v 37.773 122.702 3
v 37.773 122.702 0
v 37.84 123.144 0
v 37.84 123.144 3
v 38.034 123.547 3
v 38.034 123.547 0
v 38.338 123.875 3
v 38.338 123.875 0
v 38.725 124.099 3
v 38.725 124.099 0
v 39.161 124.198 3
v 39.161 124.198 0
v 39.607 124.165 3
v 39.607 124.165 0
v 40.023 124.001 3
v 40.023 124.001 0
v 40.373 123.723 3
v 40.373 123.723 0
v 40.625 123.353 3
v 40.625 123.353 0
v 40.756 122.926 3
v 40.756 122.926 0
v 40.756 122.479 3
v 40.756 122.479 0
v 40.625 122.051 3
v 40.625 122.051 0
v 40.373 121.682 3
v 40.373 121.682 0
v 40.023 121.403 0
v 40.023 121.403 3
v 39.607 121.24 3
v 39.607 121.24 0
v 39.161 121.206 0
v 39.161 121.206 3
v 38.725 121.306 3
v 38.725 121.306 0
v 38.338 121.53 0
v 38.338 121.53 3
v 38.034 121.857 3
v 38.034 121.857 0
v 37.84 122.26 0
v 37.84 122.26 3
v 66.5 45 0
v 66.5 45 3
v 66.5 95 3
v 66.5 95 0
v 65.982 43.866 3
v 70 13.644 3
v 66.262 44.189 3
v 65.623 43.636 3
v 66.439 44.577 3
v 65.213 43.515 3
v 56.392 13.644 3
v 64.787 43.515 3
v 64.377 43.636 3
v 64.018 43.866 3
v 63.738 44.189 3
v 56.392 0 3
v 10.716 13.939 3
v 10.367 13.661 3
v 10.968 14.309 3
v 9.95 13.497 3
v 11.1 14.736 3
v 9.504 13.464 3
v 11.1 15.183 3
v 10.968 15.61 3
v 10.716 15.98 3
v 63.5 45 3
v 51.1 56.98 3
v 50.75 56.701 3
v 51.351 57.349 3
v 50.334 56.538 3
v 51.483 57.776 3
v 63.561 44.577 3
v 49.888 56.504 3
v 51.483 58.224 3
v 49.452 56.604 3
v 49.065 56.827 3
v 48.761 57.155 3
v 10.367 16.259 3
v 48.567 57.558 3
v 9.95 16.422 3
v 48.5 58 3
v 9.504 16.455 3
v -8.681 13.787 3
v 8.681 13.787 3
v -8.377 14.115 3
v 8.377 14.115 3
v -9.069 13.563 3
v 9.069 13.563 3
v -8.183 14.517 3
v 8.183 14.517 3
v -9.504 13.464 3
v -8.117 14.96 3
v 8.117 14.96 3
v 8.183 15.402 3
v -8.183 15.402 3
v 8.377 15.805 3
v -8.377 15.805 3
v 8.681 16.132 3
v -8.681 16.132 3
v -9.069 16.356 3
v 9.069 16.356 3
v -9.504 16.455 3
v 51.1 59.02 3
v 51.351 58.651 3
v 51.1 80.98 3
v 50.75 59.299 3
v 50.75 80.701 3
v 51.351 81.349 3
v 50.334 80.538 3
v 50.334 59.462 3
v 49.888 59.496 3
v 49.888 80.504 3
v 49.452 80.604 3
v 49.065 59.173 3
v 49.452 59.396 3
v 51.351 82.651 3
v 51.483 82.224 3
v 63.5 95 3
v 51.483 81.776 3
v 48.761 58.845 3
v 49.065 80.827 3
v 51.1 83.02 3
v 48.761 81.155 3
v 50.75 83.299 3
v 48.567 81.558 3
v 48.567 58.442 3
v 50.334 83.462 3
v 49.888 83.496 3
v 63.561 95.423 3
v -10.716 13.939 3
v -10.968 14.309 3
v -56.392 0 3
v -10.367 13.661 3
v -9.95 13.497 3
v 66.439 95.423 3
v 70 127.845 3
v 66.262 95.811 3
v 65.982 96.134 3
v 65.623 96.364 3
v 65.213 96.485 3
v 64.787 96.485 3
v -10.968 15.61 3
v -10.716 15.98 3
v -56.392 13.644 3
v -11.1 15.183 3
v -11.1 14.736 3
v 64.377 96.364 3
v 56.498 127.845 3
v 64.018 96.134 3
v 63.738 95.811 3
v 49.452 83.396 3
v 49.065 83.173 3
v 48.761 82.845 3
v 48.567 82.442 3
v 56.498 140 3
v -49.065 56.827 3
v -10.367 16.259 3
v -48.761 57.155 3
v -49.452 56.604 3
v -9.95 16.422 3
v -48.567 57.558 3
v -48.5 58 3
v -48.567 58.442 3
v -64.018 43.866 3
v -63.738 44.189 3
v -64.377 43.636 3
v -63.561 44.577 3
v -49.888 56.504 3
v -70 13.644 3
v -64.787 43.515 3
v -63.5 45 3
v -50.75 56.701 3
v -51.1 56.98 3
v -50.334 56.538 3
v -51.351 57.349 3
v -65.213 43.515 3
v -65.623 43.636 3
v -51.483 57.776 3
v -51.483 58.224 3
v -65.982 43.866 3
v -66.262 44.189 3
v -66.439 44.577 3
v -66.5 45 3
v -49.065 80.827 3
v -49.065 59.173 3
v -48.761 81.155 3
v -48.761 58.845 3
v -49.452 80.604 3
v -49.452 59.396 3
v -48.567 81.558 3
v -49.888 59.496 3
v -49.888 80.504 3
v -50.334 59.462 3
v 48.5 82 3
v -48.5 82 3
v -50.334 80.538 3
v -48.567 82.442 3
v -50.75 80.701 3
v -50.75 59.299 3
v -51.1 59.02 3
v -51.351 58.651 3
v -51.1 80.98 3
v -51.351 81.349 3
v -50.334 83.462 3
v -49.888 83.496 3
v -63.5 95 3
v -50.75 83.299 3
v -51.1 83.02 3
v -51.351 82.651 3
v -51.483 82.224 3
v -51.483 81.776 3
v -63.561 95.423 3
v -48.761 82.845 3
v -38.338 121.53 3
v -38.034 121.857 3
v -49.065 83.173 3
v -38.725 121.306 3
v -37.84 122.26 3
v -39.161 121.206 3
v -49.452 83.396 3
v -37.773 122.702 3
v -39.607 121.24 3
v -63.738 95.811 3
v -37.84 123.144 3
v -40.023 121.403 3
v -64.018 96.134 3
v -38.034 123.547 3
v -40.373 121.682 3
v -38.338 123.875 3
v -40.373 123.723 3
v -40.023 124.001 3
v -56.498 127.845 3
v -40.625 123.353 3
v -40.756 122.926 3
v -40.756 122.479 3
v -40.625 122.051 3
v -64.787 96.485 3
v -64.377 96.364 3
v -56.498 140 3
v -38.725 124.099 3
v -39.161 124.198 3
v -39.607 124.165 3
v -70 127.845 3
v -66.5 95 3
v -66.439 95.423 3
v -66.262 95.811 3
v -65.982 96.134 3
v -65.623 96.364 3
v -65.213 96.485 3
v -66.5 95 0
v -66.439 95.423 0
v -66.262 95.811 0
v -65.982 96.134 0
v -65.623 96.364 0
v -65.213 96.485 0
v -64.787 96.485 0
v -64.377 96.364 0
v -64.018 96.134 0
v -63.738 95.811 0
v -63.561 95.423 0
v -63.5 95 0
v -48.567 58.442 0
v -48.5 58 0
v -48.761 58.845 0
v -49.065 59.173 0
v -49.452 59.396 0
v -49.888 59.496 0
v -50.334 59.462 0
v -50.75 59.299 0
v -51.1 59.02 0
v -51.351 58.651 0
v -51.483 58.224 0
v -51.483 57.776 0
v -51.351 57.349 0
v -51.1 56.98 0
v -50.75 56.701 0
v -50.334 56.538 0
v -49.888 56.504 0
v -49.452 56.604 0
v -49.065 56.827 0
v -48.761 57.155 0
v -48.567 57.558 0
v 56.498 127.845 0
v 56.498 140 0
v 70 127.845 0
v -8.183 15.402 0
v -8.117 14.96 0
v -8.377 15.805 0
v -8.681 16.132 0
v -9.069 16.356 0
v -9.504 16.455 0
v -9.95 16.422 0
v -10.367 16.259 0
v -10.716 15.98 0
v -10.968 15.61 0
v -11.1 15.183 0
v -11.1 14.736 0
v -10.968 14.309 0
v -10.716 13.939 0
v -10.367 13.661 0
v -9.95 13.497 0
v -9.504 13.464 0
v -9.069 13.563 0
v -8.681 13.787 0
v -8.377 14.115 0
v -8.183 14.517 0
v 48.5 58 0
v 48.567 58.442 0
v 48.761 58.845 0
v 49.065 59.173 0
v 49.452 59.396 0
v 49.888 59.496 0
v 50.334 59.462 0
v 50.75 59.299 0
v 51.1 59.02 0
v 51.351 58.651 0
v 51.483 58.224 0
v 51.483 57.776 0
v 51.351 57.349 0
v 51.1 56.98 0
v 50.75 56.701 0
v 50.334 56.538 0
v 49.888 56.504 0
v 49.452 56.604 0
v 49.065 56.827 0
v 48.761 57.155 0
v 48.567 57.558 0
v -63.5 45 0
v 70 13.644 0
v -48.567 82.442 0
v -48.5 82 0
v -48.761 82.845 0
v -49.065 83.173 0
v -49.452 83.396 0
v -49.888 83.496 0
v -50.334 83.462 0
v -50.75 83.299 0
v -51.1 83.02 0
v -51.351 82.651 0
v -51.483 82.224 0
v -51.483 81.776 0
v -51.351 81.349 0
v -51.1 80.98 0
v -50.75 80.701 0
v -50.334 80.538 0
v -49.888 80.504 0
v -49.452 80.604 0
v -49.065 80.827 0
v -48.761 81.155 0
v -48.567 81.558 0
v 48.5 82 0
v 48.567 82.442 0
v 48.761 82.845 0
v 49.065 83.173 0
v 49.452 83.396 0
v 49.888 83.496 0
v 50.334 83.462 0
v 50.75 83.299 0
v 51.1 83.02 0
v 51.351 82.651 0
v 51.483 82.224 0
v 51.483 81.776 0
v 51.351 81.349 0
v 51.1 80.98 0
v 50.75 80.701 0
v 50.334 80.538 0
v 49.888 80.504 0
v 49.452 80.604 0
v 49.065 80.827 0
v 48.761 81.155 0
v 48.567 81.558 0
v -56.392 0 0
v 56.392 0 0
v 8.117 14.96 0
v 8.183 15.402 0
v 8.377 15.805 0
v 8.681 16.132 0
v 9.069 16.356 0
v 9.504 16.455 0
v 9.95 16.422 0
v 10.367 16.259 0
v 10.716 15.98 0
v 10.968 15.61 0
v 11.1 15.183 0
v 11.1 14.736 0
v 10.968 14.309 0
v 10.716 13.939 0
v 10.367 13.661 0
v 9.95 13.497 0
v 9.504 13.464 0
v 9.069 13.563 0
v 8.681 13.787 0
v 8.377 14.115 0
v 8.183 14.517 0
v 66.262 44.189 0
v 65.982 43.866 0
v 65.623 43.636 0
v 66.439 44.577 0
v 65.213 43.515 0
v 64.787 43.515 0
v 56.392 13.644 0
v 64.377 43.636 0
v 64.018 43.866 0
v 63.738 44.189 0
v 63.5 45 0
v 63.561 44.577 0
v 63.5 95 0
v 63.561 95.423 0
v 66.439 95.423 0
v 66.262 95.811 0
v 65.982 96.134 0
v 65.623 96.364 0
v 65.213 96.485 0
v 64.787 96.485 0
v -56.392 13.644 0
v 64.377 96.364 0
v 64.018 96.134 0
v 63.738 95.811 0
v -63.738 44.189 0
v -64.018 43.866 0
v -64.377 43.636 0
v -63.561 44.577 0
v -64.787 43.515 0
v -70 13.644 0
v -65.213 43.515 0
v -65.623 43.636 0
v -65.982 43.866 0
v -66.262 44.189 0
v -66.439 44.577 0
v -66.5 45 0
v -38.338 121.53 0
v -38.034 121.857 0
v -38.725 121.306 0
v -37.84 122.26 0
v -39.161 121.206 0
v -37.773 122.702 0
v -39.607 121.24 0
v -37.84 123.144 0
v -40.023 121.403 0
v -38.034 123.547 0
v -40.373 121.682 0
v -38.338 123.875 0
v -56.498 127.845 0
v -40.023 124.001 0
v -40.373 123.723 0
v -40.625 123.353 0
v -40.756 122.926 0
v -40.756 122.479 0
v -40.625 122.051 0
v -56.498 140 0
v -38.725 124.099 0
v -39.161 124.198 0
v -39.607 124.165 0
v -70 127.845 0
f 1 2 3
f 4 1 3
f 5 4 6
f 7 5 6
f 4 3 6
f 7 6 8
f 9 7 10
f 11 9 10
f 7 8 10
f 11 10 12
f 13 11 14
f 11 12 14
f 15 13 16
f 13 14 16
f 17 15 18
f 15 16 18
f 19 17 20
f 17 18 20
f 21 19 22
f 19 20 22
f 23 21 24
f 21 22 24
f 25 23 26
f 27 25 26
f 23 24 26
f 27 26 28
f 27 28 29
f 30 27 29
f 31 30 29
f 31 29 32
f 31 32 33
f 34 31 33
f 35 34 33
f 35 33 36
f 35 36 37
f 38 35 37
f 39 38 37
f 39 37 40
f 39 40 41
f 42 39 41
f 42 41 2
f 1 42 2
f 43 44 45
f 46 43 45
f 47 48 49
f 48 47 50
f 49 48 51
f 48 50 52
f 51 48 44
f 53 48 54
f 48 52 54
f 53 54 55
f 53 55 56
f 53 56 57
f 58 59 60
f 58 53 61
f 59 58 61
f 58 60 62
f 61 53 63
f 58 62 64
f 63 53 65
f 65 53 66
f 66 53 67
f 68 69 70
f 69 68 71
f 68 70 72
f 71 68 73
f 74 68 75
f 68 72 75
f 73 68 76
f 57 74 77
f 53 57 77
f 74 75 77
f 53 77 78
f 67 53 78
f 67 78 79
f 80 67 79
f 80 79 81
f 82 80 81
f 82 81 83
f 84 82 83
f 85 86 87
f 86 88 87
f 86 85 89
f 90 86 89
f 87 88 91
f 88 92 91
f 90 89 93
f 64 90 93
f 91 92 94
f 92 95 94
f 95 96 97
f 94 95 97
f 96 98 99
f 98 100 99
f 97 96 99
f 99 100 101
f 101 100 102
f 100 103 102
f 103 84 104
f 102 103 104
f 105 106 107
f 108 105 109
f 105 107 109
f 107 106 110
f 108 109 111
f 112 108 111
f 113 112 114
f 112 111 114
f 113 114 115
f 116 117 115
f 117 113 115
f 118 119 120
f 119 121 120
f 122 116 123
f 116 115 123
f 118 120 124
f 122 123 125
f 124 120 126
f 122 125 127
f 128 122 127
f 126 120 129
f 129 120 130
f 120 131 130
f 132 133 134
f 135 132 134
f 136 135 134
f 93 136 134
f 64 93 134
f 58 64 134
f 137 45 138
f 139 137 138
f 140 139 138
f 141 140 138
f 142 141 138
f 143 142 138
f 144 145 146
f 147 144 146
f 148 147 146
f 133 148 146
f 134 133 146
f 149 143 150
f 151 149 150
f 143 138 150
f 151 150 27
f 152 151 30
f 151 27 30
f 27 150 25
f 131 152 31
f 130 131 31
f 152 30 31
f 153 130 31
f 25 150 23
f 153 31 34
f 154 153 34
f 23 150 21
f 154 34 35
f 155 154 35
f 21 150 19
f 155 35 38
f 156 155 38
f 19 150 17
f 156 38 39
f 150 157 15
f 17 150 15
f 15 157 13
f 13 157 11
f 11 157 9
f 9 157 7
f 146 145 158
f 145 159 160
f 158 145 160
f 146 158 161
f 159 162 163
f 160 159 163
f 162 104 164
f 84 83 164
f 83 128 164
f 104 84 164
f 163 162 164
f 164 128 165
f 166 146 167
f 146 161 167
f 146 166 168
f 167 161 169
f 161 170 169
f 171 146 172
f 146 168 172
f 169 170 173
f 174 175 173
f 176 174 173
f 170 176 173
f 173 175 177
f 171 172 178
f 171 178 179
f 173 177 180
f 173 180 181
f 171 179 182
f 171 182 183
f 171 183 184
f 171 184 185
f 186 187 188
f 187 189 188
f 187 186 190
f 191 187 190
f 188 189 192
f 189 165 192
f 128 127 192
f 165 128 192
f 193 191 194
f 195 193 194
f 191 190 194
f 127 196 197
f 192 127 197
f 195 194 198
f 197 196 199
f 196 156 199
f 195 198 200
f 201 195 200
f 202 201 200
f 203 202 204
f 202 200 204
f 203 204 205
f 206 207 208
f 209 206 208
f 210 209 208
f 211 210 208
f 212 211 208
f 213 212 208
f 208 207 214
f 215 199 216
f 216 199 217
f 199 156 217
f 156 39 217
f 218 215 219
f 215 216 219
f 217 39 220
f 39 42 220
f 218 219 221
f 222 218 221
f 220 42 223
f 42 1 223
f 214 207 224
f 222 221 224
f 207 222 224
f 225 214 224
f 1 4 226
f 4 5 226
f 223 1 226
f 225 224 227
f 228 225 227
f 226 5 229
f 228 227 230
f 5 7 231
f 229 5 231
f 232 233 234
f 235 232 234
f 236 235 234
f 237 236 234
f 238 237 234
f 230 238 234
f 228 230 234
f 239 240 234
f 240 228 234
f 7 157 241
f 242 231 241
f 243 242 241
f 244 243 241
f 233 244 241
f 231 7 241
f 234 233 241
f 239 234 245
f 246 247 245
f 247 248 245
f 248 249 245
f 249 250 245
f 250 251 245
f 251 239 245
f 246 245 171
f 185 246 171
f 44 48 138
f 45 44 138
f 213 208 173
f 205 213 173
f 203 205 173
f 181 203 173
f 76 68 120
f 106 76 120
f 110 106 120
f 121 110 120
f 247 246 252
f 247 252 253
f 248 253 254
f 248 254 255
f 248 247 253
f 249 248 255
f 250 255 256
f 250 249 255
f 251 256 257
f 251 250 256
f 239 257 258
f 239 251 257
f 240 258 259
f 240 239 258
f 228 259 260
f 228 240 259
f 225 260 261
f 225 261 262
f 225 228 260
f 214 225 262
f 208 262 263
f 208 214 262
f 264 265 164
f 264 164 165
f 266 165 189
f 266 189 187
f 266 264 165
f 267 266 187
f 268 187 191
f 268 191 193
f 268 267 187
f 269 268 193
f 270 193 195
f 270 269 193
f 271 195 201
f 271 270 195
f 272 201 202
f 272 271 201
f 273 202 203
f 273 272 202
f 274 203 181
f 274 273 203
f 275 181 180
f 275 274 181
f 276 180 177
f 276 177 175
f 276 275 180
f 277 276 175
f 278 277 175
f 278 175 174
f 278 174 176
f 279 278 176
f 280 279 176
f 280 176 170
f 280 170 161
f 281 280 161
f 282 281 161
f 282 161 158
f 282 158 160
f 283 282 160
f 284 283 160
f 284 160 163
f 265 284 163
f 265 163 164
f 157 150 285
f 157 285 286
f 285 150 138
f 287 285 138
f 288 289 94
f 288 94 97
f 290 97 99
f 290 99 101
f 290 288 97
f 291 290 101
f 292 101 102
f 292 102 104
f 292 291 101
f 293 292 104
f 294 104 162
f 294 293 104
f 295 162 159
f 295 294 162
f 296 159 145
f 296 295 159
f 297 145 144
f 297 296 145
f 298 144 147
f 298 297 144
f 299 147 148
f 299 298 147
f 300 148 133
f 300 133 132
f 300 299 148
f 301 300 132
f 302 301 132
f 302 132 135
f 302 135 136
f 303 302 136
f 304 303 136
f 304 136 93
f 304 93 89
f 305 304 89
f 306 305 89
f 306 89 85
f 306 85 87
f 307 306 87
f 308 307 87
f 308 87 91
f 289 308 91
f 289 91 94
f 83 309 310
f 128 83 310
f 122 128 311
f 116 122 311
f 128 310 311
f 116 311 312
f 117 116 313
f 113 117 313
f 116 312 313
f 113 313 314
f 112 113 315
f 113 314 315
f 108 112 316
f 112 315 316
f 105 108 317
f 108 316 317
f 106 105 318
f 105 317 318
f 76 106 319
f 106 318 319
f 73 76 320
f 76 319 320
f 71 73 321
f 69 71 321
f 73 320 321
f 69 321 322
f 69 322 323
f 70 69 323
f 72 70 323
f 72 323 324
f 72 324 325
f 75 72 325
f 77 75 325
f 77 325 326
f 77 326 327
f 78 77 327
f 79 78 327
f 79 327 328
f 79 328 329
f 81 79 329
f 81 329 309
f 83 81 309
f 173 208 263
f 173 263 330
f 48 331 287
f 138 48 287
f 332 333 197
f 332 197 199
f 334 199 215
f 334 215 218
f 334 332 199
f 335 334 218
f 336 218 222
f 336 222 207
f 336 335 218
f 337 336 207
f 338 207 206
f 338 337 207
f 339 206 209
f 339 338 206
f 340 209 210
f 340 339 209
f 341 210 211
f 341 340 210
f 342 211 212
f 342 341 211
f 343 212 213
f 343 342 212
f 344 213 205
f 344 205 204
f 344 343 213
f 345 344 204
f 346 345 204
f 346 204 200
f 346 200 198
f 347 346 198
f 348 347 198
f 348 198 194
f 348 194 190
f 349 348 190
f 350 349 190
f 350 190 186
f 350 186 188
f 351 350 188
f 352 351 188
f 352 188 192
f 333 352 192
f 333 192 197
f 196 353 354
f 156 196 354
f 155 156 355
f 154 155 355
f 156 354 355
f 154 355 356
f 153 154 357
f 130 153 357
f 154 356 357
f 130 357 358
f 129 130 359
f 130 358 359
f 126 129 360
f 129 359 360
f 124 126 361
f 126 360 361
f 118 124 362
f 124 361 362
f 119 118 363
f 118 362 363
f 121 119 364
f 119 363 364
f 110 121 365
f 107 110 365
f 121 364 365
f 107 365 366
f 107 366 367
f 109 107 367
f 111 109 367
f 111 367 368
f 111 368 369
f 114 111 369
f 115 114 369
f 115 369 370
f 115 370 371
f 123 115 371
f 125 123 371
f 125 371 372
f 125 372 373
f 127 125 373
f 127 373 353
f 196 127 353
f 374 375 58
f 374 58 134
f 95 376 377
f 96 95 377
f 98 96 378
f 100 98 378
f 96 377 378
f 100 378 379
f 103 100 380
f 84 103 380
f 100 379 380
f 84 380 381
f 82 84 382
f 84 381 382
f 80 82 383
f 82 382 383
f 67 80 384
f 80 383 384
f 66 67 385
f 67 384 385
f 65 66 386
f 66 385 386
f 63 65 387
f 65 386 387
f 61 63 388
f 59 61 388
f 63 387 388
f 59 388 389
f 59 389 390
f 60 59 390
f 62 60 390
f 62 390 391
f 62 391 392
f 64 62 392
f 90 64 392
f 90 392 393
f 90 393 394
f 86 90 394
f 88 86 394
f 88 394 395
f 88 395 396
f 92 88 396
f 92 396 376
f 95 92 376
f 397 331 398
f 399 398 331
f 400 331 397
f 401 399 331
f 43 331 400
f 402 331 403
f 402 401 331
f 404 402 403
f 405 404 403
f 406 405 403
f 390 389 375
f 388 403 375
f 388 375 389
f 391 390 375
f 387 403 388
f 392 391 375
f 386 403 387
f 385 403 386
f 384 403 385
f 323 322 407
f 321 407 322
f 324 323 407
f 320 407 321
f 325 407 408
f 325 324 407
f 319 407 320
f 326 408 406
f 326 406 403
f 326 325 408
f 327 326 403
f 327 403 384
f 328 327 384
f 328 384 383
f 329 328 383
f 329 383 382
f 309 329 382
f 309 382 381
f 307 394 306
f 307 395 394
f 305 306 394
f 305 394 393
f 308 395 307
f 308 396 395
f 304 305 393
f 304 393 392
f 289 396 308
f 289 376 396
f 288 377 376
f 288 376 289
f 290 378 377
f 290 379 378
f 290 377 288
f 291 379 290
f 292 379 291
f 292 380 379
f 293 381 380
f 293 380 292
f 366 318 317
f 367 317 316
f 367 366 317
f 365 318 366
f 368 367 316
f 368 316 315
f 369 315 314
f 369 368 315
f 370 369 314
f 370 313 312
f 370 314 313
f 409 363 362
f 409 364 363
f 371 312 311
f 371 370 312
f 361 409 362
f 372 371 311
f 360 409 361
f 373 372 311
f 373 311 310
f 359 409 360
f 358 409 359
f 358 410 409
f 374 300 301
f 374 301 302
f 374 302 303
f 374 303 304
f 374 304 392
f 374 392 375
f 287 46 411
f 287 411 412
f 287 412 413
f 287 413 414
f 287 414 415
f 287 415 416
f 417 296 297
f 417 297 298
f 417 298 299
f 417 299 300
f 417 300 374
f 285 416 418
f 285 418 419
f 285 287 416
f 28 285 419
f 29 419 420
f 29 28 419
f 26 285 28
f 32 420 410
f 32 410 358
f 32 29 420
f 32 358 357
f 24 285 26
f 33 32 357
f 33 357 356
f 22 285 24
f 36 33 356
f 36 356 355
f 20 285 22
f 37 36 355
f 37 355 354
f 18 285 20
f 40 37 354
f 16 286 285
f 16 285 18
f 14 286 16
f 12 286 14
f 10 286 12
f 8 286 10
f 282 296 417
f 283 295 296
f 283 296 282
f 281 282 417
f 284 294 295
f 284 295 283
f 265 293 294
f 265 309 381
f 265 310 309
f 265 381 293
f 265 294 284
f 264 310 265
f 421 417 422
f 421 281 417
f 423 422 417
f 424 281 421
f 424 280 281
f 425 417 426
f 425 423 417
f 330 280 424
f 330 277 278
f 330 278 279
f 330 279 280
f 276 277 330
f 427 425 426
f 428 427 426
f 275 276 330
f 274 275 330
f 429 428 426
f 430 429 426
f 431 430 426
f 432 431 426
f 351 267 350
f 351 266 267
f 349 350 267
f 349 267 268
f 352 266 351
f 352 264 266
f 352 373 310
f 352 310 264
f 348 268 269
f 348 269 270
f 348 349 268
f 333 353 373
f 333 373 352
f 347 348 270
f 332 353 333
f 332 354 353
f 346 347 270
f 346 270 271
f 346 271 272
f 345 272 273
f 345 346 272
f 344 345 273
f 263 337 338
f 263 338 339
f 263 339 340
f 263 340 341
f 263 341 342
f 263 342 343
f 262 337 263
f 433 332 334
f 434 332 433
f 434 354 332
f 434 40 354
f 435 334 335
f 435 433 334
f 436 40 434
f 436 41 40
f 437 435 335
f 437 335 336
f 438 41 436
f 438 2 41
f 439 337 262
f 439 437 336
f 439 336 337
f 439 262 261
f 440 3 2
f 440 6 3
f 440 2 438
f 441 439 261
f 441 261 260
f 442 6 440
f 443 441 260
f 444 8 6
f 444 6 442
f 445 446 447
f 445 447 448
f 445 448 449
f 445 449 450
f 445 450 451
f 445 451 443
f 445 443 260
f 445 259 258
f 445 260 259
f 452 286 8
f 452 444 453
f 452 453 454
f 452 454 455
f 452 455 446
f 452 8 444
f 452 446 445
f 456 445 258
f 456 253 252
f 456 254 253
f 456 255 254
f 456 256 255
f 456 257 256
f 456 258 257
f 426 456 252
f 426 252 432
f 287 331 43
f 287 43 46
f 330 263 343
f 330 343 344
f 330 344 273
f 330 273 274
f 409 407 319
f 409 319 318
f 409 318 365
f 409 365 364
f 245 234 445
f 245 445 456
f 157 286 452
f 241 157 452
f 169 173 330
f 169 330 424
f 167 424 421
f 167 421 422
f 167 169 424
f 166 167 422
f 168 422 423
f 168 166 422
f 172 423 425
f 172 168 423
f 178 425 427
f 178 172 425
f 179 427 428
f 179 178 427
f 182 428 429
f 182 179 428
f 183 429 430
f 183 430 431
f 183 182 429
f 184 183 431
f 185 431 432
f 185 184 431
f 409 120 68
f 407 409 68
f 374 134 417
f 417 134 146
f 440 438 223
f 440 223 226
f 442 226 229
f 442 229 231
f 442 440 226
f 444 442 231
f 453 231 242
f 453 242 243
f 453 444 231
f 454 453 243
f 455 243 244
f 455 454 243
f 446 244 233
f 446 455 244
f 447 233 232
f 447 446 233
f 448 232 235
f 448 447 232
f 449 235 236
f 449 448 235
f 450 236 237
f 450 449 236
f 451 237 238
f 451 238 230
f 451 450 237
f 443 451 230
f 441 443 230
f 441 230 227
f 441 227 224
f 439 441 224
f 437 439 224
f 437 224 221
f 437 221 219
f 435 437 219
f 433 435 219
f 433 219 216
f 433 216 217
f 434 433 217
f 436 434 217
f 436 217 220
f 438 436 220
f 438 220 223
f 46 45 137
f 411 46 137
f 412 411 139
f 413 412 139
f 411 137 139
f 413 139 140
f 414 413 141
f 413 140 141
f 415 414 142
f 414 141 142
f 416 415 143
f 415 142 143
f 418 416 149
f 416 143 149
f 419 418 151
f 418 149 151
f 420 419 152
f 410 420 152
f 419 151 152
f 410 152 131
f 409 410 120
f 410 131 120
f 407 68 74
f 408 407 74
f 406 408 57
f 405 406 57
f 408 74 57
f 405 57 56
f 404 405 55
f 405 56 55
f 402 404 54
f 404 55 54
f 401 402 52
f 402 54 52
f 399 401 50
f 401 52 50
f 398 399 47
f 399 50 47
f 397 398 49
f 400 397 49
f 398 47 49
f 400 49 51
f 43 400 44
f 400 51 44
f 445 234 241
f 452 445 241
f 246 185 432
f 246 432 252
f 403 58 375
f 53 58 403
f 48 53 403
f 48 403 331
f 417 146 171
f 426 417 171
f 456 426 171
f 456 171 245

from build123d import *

# Parameters (mm, degrees)
F0_W      = 70
F0_H      = 140
F1_DEPTH  = 3
F3_D      = 3
F9_D      = 3
F11_D     = 3
F12_W     = 13.50167
F12_H     = 12.155368
F13_DEPTH = 3
F14_W     = 13.607755
F14_H     = 13.643959
F15_DEPTH = 4.788373
F16_DEPTH = 36.920227


with BuildPart() as f1:
    # F0 (on Top) → F1 (new body)
    with BuildSketch(Plane.XY):
        with Locations((35, 70)):
            Rectangle(F0_W, F0_H)
    extrude(amount=F1_DEPTH)

    # F3 (through all)
    with Locations(Plane.XY.offset(3)):
        with Locations((50, 58), (50, 82)):
            Hole(F3_D / 2)

    # F9 (through all)
    with Locations(Plane.XY.offset(3)):
        with Locations((39.273195, 122.702248)):
            Hole(F9_D / 2)

    # F11 (through all)
    with Locations(Plane.XY.offset(3)):
        with Locations((9.616546, 14.959589)):
            Hole(F11_D / 2)

    # F12 (on face) → F13 (cut)
    with BuildSketch(Plane.XY.offset(3)):
        with Locations((63.249165, 133.922316)):
            Rectangle(F12_W, F12_H)
    extrude(amount=-F13_DEPTH, mode=Mode.SUBTRACT)

    # F14 (on face) → F15 (cut)
    with BuildSketch(Plane.XY.offset(3)):
        with Locations((63.196123, 6.821979)):
            Rectangle(F14_W, F14_H)
    extrude(amount=-F15_DEPTH, mode=Mode.SUBTRACT)

    # F7 (on face) → F16 (cut)
    with BuildSketch(Plane.XY.offset(3)):
        with BuildLine():
            ThreePointArc((63.5, 45), (65, 43.5), (66.5, 45))
            Line((66.5, 45), (66.5, 95))
            ThreePointArc((66.5, 95), (65, 96.5), (63.5, 95))
            Line((63.5, 95), (63.5, 45))
        make_face()
    extrude(amount=-F16_DEPTH, mode=Mode.SUBTRACT)

    # F17: F1 across plane


with BuildPart() as f1_1:
    add(f1.part)
    add(f1.part.mirror(Plane.YZ))


solid = f1_1.part
